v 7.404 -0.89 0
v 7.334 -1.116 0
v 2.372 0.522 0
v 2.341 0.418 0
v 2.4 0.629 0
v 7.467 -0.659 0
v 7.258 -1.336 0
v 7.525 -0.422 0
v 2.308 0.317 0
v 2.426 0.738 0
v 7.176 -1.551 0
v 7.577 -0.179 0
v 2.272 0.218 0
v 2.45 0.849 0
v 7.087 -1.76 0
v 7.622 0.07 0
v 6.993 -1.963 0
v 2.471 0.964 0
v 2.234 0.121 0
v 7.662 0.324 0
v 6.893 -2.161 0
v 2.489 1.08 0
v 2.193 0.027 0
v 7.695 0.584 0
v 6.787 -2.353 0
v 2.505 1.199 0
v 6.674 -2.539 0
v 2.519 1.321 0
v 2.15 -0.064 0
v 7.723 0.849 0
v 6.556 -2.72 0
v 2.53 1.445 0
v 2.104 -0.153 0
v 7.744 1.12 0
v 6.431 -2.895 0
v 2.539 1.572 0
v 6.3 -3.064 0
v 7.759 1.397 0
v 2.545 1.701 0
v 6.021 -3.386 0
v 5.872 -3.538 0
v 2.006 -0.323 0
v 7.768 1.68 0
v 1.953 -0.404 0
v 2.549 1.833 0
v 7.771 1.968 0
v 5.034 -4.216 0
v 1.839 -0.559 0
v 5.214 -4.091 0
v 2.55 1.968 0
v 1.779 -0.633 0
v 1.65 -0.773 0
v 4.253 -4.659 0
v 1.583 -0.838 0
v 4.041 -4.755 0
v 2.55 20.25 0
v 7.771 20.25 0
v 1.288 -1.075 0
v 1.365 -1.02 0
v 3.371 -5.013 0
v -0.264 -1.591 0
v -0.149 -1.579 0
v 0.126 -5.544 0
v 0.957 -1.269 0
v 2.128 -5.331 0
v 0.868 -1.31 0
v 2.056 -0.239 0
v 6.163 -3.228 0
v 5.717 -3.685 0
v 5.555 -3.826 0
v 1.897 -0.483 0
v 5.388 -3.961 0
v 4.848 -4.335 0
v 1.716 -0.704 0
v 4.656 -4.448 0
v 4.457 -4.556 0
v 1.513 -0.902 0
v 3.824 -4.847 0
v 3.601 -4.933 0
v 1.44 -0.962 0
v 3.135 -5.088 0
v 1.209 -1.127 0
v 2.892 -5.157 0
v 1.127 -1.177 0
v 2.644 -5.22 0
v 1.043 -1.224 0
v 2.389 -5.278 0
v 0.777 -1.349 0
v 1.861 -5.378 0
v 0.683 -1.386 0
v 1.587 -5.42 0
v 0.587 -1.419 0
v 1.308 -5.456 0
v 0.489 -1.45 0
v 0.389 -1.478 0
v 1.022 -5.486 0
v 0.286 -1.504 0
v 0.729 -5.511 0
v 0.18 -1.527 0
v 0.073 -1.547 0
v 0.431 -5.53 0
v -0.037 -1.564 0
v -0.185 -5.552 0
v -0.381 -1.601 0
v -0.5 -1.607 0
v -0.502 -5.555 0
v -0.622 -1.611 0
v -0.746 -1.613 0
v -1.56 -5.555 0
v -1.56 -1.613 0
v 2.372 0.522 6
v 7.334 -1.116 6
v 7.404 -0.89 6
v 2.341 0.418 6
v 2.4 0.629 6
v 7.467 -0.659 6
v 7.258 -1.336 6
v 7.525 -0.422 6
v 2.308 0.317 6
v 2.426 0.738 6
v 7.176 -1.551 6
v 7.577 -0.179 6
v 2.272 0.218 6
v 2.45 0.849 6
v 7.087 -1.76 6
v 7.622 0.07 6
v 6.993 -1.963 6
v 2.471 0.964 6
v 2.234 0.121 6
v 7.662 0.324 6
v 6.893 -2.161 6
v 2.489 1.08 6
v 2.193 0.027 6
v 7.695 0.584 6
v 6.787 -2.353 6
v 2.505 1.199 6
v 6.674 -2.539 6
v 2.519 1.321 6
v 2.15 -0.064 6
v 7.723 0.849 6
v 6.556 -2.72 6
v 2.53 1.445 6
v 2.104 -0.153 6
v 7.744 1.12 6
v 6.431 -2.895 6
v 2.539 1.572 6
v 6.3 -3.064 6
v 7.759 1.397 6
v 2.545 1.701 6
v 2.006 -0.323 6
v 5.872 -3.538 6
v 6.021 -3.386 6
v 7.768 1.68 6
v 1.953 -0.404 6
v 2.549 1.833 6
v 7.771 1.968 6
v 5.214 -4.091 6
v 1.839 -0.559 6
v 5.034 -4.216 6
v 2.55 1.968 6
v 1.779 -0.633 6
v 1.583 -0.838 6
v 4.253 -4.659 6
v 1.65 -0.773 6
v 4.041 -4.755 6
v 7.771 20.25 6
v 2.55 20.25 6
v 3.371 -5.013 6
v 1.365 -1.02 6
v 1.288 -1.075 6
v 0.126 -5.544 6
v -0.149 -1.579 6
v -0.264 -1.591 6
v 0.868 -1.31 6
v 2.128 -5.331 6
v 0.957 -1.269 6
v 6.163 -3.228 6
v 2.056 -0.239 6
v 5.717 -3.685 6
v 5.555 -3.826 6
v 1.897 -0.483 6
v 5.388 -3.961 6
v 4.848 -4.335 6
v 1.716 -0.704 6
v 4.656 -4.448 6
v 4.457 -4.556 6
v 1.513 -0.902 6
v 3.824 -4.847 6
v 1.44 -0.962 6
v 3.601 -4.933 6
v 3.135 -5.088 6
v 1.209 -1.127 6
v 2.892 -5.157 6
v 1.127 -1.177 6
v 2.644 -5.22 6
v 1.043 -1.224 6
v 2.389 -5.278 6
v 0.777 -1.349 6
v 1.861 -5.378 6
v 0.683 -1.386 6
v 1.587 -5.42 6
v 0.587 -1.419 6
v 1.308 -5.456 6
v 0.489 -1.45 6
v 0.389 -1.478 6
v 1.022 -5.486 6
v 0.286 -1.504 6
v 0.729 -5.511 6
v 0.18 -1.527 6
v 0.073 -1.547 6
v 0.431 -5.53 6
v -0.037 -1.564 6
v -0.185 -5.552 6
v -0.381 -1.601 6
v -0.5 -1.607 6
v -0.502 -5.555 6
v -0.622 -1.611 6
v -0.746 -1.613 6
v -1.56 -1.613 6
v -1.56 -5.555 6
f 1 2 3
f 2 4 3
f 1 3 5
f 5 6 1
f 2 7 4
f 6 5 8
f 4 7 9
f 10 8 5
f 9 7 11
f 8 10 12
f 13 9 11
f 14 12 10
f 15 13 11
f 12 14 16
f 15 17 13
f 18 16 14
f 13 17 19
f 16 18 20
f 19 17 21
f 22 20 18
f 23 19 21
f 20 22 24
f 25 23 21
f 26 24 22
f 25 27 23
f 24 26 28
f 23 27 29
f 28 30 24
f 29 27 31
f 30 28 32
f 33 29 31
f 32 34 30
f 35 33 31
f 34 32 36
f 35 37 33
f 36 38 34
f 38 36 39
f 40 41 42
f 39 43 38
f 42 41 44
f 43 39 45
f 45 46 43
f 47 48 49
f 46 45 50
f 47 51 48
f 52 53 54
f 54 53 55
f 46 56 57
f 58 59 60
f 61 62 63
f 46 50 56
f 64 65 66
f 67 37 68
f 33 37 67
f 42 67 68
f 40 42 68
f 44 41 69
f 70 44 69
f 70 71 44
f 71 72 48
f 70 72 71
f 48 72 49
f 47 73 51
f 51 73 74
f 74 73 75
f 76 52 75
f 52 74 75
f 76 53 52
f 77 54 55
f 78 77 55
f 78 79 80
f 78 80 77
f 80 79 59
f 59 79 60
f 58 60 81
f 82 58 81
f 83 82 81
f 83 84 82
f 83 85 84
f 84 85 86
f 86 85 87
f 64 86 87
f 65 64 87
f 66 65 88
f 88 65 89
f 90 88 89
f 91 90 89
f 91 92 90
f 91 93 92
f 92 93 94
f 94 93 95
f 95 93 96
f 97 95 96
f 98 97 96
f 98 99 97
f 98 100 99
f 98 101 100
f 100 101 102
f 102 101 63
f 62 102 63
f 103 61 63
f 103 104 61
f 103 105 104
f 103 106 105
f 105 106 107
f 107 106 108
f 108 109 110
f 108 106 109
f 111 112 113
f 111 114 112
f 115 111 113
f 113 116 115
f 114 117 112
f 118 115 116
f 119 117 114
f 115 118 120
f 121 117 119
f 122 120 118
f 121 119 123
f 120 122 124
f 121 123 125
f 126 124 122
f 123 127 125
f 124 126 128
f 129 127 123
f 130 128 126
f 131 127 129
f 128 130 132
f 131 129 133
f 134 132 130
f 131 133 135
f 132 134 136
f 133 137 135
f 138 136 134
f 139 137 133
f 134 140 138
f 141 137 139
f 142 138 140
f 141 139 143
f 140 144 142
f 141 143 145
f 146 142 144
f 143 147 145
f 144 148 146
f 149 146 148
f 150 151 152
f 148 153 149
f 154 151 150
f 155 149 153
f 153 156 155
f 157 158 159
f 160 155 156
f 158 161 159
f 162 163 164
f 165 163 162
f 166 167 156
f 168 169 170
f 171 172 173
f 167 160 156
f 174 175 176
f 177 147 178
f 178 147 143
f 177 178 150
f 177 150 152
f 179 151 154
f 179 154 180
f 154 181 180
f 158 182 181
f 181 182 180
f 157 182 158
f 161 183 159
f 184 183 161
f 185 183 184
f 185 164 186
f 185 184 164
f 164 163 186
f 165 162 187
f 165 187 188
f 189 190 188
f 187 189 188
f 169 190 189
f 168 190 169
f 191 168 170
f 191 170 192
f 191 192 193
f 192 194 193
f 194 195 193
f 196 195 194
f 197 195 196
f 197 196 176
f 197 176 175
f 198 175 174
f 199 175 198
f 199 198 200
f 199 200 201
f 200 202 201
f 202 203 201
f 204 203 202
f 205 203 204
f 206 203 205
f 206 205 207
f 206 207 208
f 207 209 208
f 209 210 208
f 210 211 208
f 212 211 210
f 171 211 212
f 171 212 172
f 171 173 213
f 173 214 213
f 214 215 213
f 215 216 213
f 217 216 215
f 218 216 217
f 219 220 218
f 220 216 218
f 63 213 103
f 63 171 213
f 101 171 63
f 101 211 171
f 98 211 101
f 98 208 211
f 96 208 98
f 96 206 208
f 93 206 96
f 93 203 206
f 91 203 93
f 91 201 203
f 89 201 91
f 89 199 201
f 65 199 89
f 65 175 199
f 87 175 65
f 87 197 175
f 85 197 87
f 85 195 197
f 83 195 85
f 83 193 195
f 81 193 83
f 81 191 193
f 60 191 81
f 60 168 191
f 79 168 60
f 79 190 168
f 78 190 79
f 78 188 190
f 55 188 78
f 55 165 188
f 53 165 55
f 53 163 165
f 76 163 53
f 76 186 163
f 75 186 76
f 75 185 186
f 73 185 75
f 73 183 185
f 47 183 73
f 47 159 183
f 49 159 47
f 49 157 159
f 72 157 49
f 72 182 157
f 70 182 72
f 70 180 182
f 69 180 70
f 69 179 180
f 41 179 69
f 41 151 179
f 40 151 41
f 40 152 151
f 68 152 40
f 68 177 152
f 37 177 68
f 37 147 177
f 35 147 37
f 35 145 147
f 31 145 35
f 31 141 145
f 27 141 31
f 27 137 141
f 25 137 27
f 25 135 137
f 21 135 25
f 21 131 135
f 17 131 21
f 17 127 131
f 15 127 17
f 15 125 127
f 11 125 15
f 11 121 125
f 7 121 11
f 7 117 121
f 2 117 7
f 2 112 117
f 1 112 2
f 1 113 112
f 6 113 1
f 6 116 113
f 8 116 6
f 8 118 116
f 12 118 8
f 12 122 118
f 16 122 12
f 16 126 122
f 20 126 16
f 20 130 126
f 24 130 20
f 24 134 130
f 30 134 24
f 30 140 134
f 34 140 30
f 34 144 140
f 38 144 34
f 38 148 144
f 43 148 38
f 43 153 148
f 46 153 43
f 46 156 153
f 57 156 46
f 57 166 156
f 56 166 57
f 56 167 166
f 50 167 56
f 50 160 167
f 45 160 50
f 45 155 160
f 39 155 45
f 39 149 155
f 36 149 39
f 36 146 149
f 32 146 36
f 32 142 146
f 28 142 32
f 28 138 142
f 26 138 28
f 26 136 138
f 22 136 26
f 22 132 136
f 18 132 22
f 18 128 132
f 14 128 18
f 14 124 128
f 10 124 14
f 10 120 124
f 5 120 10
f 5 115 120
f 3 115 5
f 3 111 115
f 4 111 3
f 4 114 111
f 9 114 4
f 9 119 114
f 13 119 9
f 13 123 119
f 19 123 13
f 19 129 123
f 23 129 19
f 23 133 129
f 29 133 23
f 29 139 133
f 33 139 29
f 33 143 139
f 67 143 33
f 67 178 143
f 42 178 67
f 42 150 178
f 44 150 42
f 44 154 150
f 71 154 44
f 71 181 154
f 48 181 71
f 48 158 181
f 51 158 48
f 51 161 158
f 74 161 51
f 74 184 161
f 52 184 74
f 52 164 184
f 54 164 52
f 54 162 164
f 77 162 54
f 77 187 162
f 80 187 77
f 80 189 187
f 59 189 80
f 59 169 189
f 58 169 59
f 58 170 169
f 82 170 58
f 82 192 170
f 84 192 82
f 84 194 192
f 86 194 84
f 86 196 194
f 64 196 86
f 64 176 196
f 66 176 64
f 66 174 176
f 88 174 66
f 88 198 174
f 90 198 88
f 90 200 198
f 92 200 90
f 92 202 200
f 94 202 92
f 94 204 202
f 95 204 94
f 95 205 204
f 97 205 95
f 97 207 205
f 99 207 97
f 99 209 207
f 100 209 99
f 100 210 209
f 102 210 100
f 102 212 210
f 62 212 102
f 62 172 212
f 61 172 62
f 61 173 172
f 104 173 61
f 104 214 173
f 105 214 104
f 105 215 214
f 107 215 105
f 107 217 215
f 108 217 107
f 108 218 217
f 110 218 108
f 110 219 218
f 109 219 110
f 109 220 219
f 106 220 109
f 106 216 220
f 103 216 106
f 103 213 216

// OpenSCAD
$fn = 200;

linear_extrude( 6 ) {
    union() {
        text( "J", 20, "DejaVu Sans:style=Bold" );
    }
}
